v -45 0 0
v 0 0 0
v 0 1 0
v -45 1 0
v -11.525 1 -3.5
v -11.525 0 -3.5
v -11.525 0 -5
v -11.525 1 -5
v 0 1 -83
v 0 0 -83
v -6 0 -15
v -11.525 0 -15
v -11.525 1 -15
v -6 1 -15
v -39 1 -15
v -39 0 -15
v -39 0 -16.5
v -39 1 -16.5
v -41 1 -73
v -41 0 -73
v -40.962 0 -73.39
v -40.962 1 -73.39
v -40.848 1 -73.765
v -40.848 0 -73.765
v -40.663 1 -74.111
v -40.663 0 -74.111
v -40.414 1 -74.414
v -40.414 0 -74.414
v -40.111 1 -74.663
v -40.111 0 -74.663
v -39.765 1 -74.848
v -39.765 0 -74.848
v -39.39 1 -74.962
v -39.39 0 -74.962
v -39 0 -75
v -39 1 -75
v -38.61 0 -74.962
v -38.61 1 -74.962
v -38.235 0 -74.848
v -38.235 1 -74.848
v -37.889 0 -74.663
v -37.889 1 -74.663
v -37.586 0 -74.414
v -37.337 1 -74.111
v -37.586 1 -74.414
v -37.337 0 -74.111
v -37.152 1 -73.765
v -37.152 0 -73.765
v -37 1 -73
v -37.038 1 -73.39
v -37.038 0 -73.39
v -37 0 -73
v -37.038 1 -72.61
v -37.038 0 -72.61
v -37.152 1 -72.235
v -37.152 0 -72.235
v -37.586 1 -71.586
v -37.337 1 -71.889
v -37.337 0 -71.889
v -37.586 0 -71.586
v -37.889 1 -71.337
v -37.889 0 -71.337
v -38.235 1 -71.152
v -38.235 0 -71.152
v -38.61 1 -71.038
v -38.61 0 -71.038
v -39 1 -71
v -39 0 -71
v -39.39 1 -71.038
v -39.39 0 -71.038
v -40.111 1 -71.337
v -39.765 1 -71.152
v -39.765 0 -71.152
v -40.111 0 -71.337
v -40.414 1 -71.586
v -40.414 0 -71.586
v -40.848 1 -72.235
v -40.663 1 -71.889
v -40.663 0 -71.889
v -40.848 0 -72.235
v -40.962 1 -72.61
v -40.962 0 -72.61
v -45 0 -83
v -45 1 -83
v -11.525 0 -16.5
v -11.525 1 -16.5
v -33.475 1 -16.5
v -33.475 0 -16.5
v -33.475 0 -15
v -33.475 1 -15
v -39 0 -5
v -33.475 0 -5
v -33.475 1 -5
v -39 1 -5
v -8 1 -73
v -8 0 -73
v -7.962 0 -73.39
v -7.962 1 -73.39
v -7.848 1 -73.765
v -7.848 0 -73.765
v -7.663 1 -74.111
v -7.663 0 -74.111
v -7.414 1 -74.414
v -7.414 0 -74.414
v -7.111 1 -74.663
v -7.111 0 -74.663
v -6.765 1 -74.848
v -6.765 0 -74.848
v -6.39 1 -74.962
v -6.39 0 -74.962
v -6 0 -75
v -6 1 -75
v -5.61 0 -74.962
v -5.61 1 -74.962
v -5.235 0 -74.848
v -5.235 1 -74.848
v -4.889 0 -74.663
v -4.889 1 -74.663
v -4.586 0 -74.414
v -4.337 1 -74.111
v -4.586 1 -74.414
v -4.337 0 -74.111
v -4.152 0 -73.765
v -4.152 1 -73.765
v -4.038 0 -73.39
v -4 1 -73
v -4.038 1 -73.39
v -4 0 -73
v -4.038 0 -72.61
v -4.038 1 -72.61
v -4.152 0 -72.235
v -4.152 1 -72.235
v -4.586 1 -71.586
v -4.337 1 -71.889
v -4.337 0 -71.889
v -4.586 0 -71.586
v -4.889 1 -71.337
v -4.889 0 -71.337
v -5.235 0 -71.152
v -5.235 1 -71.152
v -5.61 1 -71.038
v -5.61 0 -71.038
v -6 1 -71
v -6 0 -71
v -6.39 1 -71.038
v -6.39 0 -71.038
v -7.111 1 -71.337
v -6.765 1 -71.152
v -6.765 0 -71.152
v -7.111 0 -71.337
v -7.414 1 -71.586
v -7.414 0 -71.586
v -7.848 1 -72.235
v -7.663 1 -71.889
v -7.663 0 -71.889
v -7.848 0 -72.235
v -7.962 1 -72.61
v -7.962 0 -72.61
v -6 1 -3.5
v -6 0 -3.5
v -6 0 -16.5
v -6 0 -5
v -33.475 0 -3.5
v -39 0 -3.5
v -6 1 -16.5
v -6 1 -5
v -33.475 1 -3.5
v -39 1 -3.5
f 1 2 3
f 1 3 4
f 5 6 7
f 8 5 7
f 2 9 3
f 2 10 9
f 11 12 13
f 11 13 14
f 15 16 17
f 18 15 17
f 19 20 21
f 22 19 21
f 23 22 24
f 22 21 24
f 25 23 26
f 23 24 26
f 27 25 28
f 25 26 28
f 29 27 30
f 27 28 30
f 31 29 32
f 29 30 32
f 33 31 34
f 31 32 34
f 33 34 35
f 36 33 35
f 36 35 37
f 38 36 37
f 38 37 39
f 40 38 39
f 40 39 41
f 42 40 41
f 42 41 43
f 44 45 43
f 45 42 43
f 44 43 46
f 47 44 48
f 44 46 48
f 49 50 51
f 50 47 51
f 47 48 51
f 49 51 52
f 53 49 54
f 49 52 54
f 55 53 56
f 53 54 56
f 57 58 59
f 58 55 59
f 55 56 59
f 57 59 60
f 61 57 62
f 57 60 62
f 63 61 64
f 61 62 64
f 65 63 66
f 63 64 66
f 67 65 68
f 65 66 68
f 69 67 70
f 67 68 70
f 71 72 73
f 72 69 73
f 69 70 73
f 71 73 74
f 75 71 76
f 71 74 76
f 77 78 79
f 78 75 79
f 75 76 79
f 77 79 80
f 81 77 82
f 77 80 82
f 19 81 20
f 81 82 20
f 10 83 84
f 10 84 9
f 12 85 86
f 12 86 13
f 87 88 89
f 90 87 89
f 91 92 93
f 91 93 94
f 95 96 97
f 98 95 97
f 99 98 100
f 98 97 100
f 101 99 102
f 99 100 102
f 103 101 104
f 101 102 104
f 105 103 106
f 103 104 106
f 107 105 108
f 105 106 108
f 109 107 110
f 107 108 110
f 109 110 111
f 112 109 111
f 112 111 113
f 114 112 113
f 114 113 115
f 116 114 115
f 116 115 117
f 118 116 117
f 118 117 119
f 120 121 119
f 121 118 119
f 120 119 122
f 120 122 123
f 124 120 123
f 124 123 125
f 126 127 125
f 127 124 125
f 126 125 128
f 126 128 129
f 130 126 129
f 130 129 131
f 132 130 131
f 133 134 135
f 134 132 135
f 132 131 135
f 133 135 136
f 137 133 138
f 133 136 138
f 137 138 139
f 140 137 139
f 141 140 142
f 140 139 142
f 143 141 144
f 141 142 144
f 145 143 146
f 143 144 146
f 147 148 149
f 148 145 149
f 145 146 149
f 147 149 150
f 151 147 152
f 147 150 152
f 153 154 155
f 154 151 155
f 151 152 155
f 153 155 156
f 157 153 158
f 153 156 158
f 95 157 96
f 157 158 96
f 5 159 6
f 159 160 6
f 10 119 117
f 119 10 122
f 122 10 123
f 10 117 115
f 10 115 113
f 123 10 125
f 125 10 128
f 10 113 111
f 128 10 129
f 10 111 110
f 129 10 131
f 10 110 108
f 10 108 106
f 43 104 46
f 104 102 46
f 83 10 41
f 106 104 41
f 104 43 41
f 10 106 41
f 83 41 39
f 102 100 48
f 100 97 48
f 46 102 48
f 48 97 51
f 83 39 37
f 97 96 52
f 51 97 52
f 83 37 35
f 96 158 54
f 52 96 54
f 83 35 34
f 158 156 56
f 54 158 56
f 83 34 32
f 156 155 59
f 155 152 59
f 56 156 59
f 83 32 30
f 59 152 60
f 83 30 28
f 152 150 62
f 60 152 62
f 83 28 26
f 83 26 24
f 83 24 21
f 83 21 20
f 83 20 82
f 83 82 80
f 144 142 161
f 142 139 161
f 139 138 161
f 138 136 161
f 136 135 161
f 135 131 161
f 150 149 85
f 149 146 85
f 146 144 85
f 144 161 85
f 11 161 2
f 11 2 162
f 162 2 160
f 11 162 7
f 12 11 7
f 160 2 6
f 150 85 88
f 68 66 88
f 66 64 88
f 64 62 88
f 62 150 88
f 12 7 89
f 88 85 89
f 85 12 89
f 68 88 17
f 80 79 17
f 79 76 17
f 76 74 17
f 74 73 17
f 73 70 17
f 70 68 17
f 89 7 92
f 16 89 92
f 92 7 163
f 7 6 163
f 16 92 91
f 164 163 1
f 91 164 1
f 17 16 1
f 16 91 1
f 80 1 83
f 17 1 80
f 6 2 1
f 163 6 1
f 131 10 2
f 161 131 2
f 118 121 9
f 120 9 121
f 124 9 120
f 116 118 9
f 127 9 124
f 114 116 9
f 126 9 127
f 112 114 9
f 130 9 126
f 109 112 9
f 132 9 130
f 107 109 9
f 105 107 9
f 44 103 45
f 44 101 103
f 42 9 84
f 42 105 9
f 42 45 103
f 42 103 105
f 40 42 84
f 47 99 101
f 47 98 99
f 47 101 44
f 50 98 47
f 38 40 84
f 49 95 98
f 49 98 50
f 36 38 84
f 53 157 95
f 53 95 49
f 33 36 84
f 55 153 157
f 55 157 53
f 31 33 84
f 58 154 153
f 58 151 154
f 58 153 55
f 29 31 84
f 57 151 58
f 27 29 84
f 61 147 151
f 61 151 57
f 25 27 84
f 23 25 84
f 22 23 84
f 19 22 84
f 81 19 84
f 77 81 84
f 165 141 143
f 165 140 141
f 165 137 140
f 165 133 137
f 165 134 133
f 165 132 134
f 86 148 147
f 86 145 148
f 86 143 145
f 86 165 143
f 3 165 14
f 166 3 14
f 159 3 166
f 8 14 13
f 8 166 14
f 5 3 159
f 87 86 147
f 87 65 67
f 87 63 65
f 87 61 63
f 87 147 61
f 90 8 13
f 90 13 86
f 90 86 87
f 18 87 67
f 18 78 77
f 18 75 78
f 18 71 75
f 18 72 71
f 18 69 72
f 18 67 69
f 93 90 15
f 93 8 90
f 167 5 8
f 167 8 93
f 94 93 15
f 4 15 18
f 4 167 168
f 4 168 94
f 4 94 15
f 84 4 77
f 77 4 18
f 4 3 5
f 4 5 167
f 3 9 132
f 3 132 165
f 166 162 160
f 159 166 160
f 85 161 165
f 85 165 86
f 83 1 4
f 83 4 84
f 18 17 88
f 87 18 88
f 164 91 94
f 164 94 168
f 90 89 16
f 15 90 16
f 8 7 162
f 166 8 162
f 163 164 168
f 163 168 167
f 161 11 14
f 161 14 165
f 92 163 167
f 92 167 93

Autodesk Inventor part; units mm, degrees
ref_plane "YZ Plane" through (0, 0, 0) normal (1, 0, 0) x (0, 1, 0)
ref_plane "XZ Plane" through (0, 0, 0) normal (0, 1, 0) x (-1, 0, 0)
ref_plane "XY Plane" through (0, 0, 0) normal (0, 0, 1) x (1, 0, 0)
sketch "Sketch1" plane through (0, 0, 0) normal (0, 1, 0) x (-1, 0, 0)
  line L0 (0, 0) -> (45, 0)
  line L1 (45, 0) -> (45, -83)
  line L2 (45, -83) -> (0, -83)
  line L3 (0, -83) -> (0, 0)
  circle A0 centre (39, -73) radius 2
  line L4 (22.5, 0) -> (22.5, -83)
  circle A1 centre (6, -73) radius 2
  line L5 (45, -10) -> (0, -10)
  line L6 (6, -3.5) -> (11.525, -3.5)
  line L7 (11.525, -3.5) -> (11.525, -5)
  line L8 (11.525, -5) -> (6, -5)
  line L9 (6, -5) -> (6, -3.5)
  line L10 (6, -16.5) -> (11.525, -16.5)
  line L11 (11.525, -16.5) -> (11.525, -15)
  line L12 (11.525, -15) -> (6, -15)
  line L13 (6, -15) -> (6, -16.5)
  line L14 (39, -3.5) -> (33.475, -3.5)
  line L15 (33.475, -3.5) -> (33.475, -5)
  line L16 (33.475, -5) -> (39, -5)
  line L17 (39, -5) -> (39, -3.5)
  line L18 (39, -16.5) -> (33.475, -16.5)
  line L19 (33.475, -15) -> (39, -15)
  line L20 (39, -15) -> (39, -16.5)
  line L21 (33.475, -16.5) -> (33.475, -15)
  dimension "d0" = 45
  dimension "d1" = 83
  dimension "d2" = 10
  dimension "d3" = 6
  dimension "d9" = 4
  dimension "d13" = 45
  dimension "d22" = 20
  dimension "d23" = 6
  dimension "d24" = 10
  dimension "d25" = 1.5
extrude "Extrusion3" add sketch "Sketch1" along normal blind 1
equation "\"d13\" = d0"
properties part number "Platte1"
